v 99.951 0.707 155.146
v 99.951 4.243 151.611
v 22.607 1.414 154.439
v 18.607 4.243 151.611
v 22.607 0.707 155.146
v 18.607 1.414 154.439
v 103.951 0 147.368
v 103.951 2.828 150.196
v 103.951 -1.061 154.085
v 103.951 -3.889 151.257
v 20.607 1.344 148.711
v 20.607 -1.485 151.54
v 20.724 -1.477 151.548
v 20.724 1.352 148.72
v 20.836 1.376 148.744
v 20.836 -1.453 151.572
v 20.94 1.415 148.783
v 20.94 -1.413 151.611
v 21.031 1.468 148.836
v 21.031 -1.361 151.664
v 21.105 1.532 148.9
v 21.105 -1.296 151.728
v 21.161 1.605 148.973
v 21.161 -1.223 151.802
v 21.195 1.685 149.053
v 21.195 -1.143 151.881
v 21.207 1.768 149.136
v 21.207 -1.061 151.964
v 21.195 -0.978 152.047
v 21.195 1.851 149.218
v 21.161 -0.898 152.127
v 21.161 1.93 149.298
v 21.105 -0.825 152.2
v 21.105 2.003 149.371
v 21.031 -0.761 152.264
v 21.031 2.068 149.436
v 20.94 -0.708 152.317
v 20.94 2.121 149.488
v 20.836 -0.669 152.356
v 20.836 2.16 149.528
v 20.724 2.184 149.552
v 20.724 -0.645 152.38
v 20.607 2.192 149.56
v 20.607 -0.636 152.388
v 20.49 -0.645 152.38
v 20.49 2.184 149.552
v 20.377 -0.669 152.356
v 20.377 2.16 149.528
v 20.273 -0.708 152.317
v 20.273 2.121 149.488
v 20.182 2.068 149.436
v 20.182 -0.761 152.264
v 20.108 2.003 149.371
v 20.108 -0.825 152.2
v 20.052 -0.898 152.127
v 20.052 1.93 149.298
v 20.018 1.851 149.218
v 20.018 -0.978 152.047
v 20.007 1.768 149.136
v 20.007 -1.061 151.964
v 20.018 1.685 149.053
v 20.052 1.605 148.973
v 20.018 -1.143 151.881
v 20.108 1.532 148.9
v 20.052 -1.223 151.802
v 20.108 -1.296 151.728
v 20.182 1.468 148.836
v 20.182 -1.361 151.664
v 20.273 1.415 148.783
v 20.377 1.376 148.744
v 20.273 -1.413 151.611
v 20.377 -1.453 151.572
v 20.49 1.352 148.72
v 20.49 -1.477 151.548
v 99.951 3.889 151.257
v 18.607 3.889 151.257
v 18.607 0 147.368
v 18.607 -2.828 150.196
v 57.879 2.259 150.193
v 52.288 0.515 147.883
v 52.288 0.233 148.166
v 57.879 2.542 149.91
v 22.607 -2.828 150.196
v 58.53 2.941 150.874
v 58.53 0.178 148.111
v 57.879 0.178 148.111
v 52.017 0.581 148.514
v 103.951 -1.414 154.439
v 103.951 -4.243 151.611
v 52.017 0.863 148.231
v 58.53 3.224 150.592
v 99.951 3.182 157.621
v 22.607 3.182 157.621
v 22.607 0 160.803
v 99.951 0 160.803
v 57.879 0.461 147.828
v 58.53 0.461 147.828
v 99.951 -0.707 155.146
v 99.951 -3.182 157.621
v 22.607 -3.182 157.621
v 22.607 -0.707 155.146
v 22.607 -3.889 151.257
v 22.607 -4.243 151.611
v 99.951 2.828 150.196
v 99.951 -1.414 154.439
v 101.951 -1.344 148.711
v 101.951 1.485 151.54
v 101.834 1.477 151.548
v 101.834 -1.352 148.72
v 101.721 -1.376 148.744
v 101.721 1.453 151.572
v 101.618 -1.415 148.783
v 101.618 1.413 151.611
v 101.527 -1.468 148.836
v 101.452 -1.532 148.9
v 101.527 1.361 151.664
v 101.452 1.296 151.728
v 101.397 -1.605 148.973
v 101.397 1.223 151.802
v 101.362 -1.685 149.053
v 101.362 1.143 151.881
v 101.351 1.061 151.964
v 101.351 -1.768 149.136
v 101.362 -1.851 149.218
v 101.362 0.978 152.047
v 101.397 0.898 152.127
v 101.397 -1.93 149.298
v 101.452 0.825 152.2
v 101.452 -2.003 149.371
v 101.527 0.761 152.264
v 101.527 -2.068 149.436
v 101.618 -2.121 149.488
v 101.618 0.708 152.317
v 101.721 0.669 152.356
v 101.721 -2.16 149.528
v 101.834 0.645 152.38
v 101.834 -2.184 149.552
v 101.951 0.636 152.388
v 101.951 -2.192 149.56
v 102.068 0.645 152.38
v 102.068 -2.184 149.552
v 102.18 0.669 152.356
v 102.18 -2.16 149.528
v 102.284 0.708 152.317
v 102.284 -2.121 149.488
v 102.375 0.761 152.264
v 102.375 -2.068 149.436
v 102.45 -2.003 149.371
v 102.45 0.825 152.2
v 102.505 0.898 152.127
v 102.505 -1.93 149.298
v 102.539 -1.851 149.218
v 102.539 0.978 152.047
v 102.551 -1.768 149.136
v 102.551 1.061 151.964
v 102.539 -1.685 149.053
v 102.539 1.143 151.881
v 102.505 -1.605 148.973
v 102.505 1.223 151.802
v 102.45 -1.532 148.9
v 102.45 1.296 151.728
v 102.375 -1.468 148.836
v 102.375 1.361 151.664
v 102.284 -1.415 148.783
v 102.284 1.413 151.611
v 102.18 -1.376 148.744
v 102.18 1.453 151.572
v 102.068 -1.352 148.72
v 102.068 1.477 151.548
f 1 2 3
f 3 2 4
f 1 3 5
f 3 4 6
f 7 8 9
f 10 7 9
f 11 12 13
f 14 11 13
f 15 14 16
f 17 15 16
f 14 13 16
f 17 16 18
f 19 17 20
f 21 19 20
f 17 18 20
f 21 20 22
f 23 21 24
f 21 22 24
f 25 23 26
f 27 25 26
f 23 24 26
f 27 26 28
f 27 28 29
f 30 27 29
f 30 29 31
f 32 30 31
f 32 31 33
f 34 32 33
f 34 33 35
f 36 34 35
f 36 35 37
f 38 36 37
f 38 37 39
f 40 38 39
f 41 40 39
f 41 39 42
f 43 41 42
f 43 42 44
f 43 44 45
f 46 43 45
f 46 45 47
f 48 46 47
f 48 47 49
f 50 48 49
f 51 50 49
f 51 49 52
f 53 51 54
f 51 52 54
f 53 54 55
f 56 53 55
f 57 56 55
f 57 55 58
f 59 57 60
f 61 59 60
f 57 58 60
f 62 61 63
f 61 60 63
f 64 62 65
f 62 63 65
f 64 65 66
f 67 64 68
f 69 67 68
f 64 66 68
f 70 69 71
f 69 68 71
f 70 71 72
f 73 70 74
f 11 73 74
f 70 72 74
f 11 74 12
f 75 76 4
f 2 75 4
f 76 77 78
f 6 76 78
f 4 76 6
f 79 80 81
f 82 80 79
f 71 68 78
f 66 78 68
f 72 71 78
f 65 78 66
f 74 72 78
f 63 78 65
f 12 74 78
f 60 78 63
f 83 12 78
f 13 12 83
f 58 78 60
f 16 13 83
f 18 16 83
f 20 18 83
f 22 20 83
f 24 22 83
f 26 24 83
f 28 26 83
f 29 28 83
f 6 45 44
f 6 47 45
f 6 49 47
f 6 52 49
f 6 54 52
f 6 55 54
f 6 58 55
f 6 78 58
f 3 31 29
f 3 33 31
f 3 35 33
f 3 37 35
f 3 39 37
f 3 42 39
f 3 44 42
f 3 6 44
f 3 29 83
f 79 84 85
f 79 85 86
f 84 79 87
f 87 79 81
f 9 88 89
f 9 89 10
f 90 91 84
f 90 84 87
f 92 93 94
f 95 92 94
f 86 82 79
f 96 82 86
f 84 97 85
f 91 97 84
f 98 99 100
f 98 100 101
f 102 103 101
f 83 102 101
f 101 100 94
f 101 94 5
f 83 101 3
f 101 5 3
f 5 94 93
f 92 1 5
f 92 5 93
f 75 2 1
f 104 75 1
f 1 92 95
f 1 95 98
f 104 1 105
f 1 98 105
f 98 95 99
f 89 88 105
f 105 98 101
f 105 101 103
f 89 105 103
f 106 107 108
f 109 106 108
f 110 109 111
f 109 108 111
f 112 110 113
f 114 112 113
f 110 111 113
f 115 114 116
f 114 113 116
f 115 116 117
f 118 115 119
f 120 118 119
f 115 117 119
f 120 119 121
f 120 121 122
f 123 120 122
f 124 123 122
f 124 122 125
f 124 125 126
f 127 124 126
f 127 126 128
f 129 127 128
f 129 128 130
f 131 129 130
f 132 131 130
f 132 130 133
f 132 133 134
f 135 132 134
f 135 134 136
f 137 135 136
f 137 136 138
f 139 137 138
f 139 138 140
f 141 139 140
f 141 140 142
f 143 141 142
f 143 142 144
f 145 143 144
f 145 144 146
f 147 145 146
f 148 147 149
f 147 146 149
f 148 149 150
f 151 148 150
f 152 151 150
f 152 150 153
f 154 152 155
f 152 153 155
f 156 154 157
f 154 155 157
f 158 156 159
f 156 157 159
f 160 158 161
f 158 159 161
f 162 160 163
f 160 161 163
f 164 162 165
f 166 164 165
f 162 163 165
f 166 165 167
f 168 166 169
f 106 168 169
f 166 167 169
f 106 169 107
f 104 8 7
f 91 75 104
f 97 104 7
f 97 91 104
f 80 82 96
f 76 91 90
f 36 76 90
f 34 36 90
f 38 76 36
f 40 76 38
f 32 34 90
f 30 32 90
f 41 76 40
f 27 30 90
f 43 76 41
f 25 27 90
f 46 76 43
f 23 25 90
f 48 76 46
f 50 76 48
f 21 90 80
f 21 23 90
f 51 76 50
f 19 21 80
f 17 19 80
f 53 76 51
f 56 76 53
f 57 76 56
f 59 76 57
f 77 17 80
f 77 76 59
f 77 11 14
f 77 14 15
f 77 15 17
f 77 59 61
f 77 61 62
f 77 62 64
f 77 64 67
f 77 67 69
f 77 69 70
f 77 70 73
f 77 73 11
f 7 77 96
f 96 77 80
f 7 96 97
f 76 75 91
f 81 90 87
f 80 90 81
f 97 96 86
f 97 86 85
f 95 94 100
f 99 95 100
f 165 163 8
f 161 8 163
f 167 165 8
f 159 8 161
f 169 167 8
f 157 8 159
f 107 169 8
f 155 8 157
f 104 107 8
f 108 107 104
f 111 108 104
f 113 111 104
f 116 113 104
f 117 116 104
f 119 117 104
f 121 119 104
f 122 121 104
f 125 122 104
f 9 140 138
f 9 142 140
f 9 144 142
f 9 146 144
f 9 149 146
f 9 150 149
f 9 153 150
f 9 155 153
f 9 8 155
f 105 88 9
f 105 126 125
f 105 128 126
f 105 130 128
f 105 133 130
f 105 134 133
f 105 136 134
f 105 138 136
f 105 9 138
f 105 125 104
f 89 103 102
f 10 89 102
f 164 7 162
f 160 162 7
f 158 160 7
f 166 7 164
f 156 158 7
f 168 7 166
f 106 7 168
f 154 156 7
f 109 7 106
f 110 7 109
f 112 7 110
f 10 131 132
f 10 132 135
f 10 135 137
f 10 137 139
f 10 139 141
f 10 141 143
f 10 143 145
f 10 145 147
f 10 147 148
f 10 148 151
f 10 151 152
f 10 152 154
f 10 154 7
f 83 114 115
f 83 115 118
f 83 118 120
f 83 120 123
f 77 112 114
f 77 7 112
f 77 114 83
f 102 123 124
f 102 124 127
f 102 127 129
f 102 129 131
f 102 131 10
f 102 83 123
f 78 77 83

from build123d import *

# Parameters (mm, degrees)
STOCK_GOUX_START         = 18.606590305
STOCK_GOUX_LIKED_1_DEPTH = 85.344287899
BOSS_EXTRUDE1_DEPTH      = 85.344288
SKETCH2_W                = 4
SKETCH2_H                = 5.500000112
CUT_EXTRUDE1_DEPTH       = 157.288398843
SKETCH3_R                = 0.6
CUT_EXTRUDE2_DEPTH       = 157.307592951
CIRPATTERN1_COUNT        = 2
CUT_EXTRUDE3_DEPTH       = 0.4


# Read off the part's stored shape, not the designer's step: Stock-Goux Liked-1
with BuildPart() as part:
    # Stock-Goux Liked-1 outline → Stock-Goux Liked-1 (new body)
    with BuildSketch(Plane.YZ.offset(STOCK_GOUX_START)):
        Polygon((-4.242640464, 151.610592485), (-3.889087062, 151.257039083), (0, 155.146126145), (3.889087062, 151.257039083), (4.242640464, 151.610592485), (0.707106624, 155.146126325), (3.181980438, 157.621000138), (0, 160.802980576), (-3.181980438, 157.621000138), (-0.707106624, 155.146126325), align=None)
    extrude(amount=STOCK_GOUX_LIKED_1_DEPTH)

    # Sketch1 → Boss-Extrude1 (add)
    with BuildSketch(Plane.ZY.offset(-18.606590305)):
        Polygon((151.257039083, 3.889087062), (147.367952022, 0), (151.257039083, -3.889087062), (155.146126145, 0), align=None)
    extrude(amount=-BOSS_EXTRUDE1_DEPTH)

    # Sketch2 → Cut-Extrude1 (cut, symmetric)
    with BuildSketch(Plane(origin=(0, 77.926616474, 77.926616474), x_dir=(1, 0, 0), z_dir=(-7.406550393246798e-15, 0.7071067811865402, 0.7071067811865549))):
        with Locations((20.606590305, -110.954877944)):
            Rectangle(SKETCH2_W, SKETCH2_H)
    cut_extrude1 = extrude(amount=CUT_EXTRUDE1_DEPTH, both=True, mode=Mode.SUBTRACT)

    # Sketch3 → Cut-Extrude2 (cut, through all)
    with BuildSketch(Plane(origin=(0, -76.512402912, 76.512402912), x_dir=(1, 0, 0), z_dir=(4.90653893338685e-15, -0.7071067811865547, 0.7071067811865404))):
        with Locations(Location((20.606590305, 106.704878157, 0), (0, 0, 270))):
            Circle(SKETCH3_R)
    cut_extrude2 = extrude(amount=-CUT_EXTRUDE2_DEPTH, mode=Mode.SUBTRACT)

    # CirPattern1: Cut-Extrude1, Cut-Extrude2 ×2 about axis
    cirpattern1_axis = Axis((61.278734255, 0, 0), (0, 0, 1))
    add([cut_extrude1.rotate(cirpattern1_axis, i * 360 / CIRPATTERN1_COUNT) for i in range(1, CIRPATTERN1_COUNT)], mode=Mode.SUBTRACT)
    add([cut_extrude2.rotate(cirpattern1_axis, i * 360 / CIRPATTERN1_COUNT) for i in range(1, CIRPATTERN1_COUNT)], mode=Mode.SUBTRACT)

    # Sketch4 → Cut-Extrude3 (cut)
    with BuildSketch(Plane(origin=(0, -73.683976011, 73.683976011), x_dir=(1, 0, 0), z_dir=(-7.520852272753644e-15, 0.7071067811865547, -0.7071067811865404))):
        Polygon((58.529858576, -104.856160255), (58.529858576, -108.763852563), (52.017038063, -105.42603205), (52.287981573, -104.933754406), (57.878576525, -107.799649839), (57.878576525, -104.856160255), align=None)
    extrude(amount=-CUT_EXTRUDE3_DEPTH, mode=Mode.SUBTRACT)


solid = part.part
